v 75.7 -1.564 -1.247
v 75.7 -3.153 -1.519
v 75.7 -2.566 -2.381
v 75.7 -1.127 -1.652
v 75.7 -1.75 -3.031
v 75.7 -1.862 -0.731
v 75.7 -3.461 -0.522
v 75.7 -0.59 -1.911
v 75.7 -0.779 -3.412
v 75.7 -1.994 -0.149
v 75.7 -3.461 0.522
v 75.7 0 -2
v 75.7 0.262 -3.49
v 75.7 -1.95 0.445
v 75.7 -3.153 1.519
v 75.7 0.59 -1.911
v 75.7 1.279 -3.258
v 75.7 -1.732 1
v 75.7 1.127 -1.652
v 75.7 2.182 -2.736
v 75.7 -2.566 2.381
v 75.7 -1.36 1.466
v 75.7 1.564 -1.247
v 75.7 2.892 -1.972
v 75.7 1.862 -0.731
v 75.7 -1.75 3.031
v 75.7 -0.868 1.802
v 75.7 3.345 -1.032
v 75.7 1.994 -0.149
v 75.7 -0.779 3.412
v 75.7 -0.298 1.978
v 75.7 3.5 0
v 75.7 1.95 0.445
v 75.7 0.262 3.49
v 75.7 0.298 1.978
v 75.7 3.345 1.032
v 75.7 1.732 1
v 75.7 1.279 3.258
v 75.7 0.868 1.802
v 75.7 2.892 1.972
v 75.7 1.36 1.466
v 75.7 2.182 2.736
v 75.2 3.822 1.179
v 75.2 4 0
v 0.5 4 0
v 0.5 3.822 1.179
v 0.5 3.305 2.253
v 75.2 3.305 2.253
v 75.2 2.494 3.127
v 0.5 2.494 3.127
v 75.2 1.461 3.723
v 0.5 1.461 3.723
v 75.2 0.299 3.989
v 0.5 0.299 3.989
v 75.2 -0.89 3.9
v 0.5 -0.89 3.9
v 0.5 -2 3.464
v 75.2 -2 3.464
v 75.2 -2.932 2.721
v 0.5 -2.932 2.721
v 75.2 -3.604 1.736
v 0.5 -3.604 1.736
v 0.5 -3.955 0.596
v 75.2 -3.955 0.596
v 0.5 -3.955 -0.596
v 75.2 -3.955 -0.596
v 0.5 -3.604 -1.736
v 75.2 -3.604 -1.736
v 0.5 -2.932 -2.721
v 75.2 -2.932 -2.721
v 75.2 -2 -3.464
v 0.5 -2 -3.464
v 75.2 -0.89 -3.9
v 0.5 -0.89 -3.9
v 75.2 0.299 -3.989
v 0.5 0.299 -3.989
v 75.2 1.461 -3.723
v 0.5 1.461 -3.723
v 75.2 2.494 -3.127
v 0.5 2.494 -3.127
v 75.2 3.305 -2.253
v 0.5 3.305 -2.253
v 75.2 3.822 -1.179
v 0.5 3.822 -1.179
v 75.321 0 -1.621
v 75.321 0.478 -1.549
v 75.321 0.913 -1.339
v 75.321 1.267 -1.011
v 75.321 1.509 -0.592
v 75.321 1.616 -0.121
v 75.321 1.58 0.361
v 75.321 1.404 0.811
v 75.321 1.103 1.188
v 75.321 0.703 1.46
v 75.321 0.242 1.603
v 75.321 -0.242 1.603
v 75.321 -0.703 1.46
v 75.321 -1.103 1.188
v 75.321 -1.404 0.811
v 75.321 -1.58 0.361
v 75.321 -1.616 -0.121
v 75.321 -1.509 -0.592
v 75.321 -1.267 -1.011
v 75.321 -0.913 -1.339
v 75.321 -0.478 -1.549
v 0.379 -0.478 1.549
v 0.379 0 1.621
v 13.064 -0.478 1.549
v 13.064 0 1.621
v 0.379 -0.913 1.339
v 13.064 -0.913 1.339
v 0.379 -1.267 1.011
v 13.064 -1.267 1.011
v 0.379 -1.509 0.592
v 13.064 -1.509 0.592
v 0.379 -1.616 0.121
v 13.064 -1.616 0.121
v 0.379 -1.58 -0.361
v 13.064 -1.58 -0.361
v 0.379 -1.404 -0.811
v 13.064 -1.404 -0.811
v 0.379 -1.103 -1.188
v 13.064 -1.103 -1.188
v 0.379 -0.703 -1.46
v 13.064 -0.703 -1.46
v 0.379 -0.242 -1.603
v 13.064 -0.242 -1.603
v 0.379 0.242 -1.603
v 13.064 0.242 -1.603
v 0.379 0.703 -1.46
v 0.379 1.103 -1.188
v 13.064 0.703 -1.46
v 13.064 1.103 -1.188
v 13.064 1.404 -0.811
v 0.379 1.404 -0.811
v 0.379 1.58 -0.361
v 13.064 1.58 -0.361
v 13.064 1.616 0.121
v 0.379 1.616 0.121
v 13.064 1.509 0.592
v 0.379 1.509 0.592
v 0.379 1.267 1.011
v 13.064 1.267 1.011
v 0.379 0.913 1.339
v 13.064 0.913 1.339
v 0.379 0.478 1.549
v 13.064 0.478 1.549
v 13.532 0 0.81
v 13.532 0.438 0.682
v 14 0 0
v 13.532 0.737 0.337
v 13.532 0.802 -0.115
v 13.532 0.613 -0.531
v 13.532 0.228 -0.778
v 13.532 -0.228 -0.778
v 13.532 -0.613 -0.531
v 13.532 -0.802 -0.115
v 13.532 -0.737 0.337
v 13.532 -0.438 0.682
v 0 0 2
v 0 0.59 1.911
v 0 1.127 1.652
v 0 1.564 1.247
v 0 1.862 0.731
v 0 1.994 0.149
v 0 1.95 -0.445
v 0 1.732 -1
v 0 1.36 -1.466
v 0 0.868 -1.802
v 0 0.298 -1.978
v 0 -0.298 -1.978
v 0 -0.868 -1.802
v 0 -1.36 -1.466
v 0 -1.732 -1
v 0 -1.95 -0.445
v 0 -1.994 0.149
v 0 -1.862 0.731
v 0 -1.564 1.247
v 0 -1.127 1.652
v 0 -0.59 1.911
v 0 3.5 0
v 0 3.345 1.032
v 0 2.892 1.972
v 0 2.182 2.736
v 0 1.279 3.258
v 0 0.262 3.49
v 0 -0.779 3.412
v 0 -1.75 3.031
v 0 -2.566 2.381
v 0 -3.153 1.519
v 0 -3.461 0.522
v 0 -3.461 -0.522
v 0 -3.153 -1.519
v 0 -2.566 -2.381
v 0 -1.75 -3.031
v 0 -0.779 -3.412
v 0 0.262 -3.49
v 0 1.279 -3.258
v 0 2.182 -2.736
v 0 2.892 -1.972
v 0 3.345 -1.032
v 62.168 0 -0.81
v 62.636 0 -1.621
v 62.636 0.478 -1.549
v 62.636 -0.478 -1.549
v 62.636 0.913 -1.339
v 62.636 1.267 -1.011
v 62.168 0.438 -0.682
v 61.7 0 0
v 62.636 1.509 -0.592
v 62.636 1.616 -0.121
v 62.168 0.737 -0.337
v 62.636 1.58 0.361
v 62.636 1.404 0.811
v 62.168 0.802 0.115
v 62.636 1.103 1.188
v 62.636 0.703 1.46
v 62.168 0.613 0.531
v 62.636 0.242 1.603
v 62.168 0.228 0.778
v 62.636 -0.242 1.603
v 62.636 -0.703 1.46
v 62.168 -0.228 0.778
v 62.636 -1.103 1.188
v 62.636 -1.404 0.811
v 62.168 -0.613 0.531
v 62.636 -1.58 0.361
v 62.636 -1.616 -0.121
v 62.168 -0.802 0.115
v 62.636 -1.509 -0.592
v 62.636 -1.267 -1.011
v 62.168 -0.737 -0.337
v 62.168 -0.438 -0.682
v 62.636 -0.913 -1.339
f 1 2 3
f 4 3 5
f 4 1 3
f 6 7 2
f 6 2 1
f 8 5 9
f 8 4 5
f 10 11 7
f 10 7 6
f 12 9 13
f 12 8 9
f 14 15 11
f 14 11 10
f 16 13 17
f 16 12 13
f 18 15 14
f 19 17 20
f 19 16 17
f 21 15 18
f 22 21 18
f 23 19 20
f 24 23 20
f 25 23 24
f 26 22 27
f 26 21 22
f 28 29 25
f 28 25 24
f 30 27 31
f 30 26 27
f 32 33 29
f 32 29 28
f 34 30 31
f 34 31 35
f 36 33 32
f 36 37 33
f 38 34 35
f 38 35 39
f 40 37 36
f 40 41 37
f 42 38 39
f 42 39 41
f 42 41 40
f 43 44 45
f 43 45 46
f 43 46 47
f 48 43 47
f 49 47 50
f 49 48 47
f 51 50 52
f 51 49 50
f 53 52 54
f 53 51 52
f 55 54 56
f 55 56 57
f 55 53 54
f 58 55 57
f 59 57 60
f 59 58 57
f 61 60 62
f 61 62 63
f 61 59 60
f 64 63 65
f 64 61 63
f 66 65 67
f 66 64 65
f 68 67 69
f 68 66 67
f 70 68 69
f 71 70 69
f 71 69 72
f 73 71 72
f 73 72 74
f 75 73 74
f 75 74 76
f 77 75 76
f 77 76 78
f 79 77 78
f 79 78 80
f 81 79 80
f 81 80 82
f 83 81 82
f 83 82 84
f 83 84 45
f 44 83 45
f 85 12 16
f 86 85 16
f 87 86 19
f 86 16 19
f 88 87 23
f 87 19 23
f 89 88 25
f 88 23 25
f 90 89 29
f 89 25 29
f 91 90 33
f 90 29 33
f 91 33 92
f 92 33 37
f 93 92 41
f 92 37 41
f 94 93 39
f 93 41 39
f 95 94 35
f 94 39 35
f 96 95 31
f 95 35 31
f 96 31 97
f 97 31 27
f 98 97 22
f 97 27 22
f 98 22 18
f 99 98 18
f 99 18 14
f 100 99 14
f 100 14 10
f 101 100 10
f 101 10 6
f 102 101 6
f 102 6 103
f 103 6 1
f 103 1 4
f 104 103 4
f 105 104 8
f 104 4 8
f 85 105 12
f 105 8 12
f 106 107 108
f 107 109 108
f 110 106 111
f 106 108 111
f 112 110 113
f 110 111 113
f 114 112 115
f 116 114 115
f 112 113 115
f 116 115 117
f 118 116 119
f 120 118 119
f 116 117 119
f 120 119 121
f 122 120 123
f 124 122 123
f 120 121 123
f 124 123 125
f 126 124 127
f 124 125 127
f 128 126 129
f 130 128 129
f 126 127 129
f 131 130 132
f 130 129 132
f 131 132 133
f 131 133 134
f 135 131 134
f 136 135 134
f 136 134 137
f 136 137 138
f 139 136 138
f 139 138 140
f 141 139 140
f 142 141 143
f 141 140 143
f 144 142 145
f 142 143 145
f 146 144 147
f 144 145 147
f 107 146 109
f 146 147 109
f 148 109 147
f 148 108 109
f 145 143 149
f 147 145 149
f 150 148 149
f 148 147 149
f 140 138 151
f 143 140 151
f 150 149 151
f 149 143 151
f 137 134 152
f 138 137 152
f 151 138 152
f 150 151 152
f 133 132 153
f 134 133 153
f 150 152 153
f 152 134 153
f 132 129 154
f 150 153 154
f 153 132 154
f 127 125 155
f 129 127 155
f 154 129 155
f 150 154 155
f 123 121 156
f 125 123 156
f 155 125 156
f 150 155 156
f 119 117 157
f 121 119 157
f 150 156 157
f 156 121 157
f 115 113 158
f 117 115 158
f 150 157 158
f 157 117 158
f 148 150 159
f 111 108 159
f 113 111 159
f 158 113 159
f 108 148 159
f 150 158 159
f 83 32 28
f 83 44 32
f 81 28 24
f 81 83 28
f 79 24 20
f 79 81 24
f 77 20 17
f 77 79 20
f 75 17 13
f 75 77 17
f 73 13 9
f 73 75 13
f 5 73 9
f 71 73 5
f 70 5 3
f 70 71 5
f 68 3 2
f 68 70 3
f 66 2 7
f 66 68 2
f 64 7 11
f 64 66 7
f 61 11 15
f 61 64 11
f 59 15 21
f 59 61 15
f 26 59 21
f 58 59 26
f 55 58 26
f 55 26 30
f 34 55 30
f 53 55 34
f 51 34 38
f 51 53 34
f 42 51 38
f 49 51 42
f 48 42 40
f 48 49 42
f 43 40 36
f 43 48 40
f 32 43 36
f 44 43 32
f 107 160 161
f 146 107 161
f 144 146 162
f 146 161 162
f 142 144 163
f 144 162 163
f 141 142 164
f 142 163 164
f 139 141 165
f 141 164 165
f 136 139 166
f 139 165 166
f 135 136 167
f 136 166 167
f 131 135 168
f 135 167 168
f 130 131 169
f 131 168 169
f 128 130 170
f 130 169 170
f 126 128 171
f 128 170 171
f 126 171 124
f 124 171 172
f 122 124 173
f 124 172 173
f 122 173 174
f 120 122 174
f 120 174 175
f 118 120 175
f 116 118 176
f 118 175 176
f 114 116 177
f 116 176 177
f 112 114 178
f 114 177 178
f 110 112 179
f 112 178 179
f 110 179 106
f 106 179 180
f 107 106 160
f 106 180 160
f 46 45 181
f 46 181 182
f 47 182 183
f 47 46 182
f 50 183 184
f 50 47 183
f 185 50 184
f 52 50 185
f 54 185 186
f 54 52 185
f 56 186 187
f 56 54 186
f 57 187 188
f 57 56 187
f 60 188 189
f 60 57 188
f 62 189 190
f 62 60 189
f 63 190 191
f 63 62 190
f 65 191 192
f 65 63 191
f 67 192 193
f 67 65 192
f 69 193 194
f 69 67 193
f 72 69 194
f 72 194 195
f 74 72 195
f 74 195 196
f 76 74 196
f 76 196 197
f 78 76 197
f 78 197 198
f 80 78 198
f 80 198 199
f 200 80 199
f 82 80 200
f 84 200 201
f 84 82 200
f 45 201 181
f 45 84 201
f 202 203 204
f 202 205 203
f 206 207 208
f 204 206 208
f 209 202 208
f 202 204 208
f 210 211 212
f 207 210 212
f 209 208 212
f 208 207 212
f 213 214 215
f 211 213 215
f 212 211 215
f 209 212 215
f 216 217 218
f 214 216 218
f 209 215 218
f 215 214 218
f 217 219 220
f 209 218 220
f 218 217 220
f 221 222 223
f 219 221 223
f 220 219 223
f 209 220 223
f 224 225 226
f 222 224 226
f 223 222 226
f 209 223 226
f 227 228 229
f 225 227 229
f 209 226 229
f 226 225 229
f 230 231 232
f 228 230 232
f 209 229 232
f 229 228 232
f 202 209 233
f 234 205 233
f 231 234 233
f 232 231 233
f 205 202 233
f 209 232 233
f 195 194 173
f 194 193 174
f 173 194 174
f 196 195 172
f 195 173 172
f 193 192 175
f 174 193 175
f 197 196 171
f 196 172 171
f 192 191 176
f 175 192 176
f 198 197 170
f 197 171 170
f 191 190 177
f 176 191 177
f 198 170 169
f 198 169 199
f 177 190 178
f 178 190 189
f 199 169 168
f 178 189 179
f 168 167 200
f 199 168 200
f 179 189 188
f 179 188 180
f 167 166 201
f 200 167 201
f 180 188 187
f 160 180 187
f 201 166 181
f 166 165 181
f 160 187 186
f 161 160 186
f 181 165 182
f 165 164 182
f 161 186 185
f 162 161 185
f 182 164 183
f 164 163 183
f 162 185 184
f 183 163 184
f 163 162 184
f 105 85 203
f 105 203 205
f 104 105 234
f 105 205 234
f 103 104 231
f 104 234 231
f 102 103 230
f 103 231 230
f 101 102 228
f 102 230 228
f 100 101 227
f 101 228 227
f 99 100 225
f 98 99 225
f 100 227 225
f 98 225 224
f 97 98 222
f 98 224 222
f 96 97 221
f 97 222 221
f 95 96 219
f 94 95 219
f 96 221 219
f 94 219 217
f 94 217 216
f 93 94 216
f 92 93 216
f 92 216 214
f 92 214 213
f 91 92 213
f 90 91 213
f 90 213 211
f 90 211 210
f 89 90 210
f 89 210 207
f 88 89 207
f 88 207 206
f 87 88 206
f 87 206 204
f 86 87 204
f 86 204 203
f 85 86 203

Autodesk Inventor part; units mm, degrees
ref_plane "YZ Plane" through (0, 0, 0) normal (1, 0, 0) x (0, 1, 0)
ref_plane "XZ Plane" through (0, 0, 0) normal (0, 1, 0) x (-1, 0, 0)
ref_plane "XY Plane" through (0, 0, 0) normal (0, 0, 1) x (1, 0, 0)
sketch "Sketch_1" plane through (0, 0, 0) normal (0, 0, 1) x (1, 0, 0)
  line L0 (75.7, 0) -> (0, 0)
  line L1 (0, 0) -> (0, 3.5)
  line L2 (0, 3.5) -> (0.5, 4)
  line L3 (0.5, 4) -> (75.2, 4)
  line L4 (75.2, 4) -> (75.7, 3.5)
  line L5 (75.7, 3.5) -> (75.7, 0)
  line L6 (75.7, 0) -> (0, 0)
revolve "Revolution1" add sketch "Sketch_1" angle 360 about axis through (75.7, 0, 0) along (1, 0, 0)
sketch "Sketch2" plane through (0, 0, 0) normal (-1, 0, 0) x (0, 0, 1)
  point P0 (0, 0)
hole "Hole1" at (0, 0, 0) direction (1, 0, 0) diameter 3.242 depth 13.0641 tip angle 120 countersink diameter 4 countersink angle 90 thread size "M4x0.7" class "6H" standard "ISO Metric profile"
sketch "Sketch3" plane through (75.7, 0, 0) normal (1, 0, 0) x (0, 0, -1)
  point P0 (0, 0)
hole "Hole2" at (75.7, 0, 0) direction (-1, 0, 0) diameter 3.242 depth 13.0641 tip angle 120 countersink diameter 4 countersink angle 90 thread size "M4x0.7" class "6H" standard "ISO Metric profile"
properties part number "SFHRW8-75_7-M4-N4_s" material "鋼、炭素鋼"
